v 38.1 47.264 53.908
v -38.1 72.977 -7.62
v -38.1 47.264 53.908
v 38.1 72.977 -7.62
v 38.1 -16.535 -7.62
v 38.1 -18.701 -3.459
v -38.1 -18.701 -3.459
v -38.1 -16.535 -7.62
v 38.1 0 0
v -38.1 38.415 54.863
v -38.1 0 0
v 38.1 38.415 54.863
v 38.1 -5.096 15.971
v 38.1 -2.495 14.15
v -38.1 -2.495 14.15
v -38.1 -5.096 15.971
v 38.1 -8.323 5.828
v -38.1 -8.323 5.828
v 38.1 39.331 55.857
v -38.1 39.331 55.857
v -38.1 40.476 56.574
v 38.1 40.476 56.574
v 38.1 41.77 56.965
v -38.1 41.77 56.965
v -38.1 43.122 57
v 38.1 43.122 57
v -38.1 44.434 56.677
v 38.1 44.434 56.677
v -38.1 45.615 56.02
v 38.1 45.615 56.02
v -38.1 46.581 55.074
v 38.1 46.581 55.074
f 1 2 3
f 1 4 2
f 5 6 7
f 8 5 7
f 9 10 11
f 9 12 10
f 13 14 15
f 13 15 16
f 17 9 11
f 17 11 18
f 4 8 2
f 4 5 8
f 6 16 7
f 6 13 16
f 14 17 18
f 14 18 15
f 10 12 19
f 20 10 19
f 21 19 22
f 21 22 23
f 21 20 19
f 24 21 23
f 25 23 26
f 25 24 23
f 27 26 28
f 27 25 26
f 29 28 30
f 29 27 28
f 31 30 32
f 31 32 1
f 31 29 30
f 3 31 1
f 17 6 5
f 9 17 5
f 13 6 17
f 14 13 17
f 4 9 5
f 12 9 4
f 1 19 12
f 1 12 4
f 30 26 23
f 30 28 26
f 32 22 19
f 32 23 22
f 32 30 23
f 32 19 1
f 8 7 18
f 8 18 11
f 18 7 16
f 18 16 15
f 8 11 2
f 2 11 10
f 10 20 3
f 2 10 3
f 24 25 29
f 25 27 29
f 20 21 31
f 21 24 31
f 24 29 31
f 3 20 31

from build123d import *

# Parameters (mm, degrees)
F1_DEPTH = 38.1
F2_R     = 5.08
F3_SIZE  = 5.08


with BuildPart() as f1:
    # F0 (on Right) → F1 (new body, symmetric)
    with BuildSketch(Plane.YZ):
        Polygon((43.706524, 62.419386), (0, 0), (-8.322585, 5.827537), (-2.495048, 14.150121), (-5.095856, 15.971227), (-21.614611, -7.62), (72.976895, -7.62), align=None)
    extrude(amount=F1_DEPTH, both=True)

    # F2
    f2_edges = [f1.edges().sort_by_distance(p)[0] for p in [
        (0, 43.706524, 62.419386),
    ]]
    fillet(f2_edges, radius=F2_R)

    # F3
    f3_edges = [f1.edges().sort_by_distance(p)[0] for p in [
        (0, -21.614611, -7.62),
    ]]
    chamfer(f3_edges, length=F3_SIZE)


solid = f1.part
